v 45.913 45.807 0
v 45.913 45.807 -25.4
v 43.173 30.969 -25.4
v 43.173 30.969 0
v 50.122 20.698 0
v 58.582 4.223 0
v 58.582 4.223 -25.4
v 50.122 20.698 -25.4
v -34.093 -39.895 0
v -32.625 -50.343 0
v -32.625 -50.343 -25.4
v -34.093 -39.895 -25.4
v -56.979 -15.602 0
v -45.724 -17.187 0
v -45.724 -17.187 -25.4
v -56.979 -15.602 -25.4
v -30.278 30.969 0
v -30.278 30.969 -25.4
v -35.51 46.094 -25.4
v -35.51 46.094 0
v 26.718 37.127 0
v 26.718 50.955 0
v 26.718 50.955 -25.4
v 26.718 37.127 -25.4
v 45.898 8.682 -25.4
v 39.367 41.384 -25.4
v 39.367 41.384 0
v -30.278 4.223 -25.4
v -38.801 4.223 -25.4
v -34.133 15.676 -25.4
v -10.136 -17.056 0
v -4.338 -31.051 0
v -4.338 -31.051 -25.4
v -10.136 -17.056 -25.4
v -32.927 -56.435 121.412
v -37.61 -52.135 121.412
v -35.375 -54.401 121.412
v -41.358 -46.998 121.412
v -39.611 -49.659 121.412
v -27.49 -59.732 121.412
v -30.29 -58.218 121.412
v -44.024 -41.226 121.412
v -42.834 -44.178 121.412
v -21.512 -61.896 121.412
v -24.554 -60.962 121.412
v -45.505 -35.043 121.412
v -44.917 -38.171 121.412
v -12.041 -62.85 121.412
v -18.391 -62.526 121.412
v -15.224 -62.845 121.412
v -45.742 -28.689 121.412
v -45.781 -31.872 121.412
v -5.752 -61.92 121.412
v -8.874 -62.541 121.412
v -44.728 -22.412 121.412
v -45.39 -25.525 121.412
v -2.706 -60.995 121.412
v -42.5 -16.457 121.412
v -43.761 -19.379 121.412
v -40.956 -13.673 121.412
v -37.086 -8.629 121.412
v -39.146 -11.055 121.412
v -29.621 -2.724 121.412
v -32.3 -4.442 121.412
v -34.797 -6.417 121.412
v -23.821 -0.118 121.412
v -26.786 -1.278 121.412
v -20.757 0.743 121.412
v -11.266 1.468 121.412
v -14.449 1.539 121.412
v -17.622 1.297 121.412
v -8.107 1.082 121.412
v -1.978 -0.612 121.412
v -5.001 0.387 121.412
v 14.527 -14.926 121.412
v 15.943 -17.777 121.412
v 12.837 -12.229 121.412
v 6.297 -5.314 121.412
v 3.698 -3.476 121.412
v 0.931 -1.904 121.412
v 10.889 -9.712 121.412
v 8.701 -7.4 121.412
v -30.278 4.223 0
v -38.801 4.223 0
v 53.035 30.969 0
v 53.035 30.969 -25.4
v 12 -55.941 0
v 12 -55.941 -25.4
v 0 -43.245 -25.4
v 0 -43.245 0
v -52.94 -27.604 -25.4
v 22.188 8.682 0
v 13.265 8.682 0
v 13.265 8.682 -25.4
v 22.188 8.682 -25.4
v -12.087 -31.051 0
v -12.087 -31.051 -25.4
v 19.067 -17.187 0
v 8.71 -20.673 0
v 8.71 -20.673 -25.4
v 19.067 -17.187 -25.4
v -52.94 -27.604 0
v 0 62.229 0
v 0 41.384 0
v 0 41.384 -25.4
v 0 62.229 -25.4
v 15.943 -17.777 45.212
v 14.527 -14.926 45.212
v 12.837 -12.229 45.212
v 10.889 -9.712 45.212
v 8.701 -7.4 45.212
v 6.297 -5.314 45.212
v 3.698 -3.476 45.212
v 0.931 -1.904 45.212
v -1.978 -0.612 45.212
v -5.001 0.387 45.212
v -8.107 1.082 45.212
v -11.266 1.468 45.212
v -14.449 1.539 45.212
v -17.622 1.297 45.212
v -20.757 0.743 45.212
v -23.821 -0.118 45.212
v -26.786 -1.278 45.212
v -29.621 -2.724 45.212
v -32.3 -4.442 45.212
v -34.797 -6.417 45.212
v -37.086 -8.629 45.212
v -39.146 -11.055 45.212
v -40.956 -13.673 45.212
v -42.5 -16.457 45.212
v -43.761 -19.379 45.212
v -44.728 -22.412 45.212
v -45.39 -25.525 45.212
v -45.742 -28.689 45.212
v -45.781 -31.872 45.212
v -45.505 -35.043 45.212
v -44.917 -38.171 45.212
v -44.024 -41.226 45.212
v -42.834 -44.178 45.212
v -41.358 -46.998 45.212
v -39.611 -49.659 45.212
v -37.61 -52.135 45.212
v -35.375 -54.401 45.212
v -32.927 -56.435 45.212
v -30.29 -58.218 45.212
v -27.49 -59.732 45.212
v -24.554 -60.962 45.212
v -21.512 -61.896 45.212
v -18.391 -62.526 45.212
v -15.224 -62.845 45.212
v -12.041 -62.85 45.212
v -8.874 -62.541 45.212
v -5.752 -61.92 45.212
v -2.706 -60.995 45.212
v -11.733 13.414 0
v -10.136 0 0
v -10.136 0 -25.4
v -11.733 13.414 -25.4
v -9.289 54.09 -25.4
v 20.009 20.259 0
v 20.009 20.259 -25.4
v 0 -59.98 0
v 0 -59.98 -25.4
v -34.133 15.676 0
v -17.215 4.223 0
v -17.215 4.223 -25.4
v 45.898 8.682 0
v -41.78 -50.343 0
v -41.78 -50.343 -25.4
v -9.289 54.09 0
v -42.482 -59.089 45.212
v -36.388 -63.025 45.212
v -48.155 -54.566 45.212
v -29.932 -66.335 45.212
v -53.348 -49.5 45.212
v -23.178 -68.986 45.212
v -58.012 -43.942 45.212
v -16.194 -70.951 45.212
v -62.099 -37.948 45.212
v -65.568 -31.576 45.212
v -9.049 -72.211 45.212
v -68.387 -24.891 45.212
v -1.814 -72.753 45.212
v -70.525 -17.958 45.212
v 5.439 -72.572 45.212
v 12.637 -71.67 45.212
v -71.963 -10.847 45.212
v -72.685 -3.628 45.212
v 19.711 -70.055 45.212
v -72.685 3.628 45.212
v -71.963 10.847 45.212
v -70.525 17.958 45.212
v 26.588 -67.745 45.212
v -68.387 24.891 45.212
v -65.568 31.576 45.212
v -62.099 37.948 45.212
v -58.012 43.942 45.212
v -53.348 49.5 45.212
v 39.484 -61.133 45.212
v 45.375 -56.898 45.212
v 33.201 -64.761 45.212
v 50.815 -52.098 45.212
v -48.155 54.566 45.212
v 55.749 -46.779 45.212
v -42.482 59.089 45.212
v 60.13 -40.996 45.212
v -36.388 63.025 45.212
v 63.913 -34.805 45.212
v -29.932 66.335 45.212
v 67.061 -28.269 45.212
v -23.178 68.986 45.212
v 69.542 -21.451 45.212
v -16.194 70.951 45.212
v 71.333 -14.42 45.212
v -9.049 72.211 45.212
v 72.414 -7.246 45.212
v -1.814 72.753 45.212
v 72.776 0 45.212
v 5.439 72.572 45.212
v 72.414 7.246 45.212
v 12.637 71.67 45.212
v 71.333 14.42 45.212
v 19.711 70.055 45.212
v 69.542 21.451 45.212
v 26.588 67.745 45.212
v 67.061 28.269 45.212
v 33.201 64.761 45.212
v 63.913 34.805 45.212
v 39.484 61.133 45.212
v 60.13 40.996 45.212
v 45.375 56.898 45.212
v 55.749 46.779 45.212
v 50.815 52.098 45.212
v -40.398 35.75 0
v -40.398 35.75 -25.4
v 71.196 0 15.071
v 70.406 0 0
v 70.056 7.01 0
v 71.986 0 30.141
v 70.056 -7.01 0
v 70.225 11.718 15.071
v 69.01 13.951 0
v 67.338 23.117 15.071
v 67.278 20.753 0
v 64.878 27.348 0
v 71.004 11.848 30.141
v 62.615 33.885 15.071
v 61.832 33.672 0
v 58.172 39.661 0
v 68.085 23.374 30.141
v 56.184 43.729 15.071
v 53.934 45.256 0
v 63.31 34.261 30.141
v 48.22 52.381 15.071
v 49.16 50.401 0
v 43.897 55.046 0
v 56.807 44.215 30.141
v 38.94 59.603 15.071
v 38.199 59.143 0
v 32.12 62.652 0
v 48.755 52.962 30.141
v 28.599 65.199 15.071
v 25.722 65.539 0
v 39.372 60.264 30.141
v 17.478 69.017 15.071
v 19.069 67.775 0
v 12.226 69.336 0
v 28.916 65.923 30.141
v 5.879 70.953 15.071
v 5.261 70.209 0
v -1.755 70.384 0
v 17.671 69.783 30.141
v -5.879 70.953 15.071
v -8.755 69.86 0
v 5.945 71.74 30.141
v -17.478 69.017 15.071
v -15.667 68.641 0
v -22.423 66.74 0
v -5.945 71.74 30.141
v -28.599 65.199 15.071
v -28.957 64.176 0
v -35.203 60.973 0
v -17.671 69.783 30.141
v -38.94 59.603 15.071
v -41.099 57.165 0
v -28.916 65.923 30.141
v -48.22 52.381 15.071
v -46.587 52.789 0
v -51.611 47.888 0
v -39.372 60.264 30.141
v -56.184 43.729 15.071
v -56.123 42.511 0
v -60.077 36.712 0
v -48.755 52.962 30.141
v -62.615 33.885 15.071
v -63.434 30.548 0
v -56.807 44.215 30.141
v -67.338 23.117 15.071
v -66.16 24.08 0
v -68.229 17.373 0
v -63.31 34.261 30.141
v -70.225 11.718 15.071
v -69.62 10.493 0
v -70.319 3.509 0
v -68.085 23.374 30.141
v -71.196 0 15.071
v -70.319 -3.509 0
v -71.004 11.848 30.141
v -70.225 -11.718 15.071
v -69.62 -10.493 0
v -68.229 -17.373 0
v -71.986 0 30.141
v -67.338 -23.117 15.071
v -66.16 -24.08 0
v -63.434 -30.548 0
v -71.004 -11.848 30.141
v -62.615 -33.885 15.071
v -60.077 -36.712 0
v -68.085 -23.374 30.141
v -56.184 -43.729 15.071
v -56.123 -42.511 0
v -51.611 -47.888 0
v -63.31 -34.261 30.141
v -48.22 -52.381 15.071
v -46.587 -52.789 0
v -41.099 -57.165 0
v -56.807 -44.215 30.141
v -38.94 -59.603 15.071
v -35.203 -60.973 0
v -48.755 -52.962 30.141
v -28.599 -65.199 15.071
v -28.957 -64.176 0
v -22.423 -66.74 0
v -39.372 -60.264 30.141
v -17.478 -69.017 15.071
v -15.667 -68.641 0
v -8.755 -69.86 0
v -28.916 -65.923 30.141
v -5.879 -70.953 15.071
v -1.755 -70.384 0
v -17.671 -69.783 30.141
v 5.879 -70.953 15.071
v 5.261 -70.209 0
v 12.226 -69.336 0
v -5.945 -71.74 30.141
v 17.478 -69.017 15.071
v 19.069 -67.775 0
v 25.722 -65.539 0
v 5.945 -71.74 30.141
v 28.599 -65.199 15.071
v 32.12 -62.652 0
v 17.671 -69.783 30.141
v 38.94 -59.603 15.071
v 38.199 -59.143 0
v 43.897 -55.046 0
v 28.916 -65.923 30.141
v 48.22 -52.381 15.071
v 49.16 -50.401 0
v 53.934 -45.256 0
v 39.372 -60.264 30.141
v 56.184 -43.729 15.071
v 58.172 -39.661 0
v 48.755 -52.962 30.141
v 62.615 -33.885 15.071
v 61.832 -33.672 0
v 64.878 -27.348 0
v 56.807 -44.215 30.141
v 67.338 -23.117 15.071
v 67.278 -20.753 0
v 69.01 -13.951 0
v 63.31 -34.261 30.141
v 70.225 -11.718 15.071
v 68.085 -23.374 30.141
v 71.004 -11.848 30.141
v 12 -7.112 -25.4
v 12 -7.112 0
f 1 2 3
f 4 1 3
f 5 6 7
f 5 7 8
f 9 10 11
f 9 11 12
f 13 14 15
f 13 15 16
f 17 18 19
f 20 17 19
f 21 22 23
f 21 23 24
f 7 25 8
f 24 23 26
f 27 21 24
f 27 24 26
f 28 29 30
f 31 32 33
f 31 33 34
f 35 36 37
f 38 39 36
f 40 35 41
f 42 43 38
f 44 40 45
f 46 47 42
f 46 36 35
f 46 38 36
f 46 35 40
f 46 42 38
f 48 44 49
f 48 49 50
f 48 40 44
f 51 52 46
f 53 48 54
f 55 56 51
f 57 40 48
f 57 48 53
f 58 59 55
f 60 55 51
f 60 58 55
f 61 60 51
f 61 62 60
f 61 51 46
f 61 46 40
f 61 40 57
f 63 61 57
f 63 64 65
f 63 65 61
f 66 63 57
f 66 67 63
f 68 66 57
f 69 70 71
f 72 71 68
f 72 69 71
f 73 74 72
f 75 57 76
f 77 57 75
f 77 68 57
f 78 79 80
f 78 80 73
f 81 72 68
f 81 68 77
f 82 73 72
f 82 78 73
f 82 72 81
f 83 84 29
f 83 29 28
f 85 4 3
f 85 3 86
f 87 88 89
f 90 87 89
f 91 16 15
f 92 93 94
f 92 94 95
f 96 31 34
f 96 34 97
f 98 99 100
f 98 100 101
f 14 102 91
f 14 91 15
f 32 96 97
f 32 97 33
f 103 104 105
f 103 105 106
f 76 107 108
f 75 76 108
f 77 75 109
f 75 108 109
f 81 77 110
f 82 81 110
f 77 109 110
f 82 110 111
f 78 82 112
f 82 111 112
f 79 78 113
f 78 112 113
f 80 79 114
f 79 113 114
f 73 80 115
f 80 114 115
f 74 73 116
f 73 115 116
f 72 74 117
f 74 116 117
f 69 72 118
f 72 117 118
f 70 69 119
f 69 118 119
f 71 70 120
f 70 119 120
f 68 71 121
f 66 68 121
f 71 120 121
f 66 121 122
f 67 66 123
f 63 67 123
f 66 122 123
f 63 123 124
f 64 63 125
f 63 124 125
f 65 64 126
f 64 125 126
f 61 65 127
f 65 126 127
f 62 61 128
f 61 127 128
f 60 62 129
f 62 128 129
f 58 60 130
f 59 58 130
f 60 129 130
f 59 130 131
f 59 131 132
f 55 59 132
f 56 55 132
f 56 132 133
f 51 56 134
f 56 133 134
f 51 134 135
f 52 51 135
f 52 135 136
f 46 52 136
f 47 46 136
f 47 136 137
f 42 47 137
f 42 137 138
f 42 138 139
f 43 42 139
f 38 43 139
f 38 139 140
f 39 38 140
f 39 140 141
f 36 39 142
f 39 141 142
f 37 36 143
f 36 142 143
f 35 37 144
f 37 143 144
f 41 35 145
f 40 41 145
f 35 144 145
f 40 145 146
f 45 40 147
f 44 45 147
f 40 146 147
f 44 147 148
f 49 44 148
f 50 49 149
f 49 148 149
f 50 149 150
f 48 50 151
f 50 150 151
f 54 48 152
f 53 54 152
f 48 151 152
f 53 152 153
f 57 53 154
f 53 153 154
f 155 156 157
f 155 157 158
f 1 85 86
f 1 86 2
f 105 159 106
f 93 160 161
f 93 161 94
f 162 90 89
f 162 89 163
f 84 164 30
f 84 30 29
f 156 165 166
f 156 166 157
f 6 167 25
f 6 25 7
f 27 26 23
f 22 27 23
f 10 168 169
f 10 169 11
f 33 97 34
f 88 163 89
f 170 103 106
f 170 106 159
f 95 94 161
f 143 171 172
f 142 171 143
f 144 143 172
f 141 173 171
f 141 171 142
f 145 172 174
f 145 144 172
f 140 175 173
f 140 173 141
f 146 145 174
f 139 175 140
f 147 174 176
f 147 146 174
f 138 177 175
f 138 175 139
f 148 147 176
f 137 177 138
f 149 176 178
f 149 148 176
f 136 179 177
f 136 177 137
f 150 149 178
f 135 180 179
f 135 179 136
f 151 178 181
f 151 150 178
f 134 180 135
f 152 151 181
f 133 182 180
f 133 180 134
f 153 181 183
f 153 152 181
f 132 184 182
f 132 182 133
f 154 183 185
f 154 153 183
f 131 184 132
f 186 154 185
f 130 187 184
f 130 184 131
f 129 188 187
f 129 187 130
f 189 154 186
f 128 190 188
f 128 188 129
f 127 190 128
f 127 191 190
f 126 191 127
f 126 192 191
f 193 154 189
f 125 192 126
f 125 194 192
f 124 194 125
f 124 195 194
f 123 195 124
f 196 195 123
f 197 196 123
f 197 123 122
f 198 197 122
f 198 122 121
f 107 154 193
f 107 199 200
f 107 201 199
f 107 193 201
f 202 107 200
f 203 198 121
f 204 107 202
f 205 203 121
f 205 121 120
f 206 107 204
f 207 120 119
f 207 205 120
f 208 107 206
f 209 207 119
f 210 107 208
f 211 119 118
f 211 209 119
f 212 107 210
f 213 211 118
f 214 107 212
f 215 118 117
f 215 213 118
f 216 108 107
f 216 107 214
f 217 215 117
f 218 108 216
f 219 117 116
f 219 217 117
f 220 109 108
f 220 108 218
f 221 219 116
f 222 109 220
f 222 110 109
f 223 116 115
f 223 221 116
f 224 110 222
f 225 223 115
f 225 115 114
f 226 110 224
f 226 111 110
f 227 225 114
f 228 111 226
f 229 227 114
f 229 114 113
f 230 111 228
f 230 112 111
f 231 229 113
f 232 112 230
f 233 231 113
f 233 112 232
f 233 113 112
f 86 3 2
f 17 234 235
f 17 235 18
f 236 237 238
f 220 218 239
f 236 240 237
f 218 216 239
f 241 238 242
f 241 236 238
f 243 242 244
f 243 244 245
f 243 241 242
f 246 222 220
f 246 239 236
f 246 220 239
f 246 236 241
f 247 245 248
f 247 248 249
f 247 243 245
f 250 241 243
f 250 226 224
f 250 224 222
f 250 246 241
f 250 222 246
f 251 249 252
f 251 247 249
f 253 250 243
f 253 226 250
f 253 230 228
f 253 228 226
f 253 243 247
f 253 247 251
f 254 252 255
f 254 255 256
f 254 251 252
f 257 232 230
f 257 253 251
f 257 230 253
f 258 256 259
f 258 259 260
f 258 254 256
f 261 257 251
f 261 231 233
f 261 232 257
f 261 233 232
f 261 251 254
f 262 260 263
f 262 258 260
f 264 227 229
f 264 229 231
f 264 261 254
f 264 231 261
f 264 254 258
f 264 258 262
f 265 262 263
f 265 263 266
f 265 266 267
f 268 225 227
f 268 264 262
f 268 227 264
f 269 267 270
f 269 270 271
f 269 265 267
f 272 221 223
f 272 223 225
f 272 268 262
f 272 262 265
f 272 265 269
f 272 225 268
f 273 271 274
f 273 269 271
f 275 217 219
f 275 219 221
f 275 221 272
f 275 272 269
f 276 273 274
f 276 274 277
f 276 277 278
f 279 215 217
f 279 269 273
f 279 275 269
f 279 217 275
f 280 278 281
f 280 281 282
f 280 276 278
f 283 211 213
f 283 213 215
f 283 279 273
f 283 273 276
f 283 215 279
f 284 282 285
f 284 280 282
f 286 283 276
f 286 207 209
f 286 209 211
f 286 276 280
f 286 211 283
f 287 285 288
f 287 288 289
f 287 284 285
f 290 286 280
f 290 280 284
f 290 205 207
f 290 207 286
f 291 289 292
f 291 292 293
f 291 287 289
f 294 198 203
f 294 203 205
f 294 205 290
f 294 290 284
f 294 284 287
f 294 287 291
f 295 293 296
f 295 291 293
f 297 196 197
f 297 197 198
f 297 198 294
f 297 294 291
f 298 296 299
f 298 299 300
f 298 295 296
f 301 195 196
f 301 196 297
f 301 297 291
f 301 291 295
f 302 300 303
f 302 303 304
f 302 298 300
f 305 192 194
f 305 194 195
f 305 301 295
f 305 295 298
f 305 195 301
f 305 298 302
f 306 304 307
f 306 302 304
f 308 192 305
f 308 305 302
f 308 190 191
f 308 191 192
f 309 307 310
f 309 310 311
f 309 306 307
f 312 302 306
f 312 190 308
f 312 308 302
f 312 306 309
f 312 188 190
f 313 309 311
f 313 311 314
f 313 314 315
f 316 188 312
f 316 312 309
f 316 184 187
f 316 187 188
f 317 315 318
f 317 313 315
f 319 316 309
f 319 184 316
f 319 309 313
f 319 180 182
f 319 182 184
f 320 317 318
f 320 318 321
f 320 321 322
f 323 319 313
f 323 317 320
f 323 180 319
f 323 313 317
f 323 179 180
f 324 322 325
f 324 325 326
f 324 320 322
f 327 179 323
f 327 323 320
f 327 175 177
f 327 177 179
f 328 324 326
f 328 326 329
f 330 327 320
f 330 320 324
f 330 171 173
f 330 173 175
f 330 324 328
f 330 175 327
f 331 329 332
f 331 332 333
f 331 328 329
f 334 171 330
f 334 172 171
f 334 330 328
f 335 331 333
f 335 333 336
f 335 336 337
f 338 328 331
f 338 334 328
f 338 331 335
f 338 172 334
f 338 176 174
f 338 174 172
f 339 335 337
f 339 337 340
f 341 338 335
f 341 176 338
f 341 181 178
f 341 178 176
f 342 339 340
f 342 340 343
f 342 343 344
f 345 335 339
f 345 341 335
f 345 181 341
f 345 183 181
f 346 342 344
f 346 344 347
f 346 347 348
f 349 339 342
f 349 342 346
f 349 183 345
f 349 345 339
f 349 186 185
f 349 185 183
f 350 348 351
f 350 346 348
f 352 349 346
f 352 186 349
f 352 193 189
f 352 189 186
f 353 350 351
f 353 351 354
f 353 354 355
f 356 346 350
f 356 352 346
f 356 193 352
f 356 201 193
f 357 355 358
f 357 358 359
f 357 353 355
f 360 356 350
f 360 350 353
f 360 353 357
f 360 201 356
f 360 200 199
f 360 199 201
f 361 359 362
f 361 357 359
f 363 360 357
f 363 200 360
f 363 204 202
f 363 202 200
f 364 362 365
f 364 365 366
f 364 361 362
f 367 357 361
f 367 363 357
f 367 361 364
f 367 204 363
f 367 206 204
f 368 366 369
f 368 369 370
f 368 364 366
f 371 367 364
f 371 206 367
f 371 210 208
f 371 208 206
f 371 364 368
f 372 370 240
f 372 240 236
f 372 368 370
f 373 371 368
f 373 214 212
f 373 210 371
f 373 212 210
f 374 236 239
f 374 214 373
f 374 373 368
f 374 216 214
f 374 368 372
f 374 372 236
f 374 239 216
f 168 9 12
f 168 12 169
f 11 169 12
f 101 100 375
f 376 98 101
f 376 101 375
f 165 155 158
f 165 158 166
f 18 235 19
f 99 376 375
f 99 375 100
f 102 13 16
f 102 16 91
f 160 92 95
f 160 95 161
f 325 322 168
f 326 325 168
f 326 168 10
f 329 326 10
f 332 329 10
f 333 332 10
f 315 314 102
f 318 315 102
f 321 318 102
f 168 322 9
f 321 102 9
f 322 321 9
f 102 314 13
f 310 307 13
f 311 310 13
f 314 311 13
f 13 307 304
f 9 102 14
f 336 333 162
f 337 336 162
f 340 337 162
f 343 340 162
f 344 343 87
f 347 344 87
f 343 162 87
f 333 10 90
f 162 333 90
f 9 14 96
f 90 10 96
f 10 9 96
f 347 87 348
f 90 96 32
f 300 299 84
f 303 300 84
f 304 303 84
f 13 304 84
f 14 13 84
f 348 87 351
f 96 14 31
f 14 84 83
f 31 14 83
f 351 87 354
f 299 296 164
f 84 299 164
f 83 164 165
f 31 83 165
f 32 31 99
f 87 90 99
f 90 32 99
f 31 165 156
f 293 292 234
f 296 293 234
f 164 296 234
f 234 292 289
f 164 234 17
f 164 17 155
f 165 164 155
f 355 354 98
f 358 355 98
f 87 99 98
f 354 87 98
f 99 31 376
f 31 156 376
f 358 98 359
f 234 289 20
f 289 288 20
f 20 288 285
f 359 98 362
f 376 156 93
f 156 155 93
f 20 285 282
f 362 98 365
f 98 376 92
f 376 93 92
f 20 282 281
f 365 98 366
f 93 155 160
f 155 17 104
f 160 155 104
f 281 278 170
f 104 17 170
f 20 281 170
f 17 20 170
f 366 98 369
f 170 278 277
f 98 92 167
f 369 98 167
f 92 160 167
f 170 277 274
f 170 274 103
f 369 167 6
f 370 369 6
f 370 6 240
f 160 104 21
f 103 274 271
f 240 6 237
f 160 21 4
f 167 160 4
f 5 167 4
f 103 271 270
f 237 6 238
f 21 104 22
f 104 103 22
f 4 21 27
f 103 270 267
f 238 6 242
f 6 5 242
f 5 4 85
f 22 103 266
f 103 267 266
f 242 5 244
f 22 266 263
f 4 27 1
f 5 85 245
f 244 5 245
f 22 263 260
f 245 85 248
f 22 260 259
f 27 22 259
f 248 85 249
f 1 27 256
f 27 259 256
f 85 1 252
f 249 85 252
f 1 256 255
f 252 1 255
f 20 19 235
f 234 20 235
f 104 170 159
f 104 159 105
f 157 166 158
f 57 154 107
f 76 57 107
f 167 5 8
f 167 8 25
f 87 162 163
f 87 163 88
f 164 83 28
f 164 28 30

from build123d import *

# Parameters (mm, degrees)
F0_R     = 70.4060521859
F1_DEPTH = 45.212
F1_TAPER = -3
F4_DEPTH = 25.4
F6_DEPTH = 76.2


with BuildPart() as f1:
    # F0 (on Top) → F1 (new body)
    with BuildSketch(Plane.XY):
        Circle(F0_R)
    extrude(amount=F1_DEPTH, taper=F1_TAPER)

    # F3 (on face) → F4 (join)
    with BuildSketch(Plane.XY):
        Polygon((13.2651496679, 8.6820758879), (22.1880245954, 8.6820758879), (20.0088638812, 20.2589873224), align=None)
        Polygon((26.7175994813, 37.1265895665), (39.3666066229, 41.3835719228), (26.7175994813, 50.9552955627), align=None)
        Polygon((0, 41.3835719228), (0, 62.2292943299), (-9.2889685184, 54.0895685554), align=None)
        Polygon((-17.2152053565, 4.2226207443), (-10.1358499378, 0), (-11.7327948169, 13.4140530589), align=None)
        Polygon((-12.0866000652, -31.0505852103), (-4.3377871625, -31.0505852103), (-10.1358499378, -17.055625096), align=None)
        Polygon((0, -59.9799224224), (12.0000867173, -55.9413321316), (0, -43.2448089123), align=None)
        Polygon((45.8979159594, 8.6820758879), (58.5819035769, 4.2226207443), (50.1223825414, 20.6976876816), align=None)
        Polygon((-40.3976216912, 35.750195384), (-30.278051272, 30.9688523412), (-35.5101494777, 46.0943850381), align=None)
        Polygon((-52.9398620129, -27.6039075106), (-45.7244627178, -17.1867813915), (-56.9789598161, -15.6023127936), align=None)
        Polygon((8.7098376591, -20.6725607113), (19.0673265606, -17.1867813915), (12.0000867173, -7.1116369218), align=None)
        Polygon((-38.8014949858, 4.2226207443), (-30.278051272, 4.2226207443), (-34.1327454541, 15.676286782), align=None)
        Polygon((-41.7802073061, -50.3433160484), (-32.6245762408, -50.3433160484), (-34.0931266546, -39.8950539529), align=None)
        Polygon((43.1729927659, 30.9688523412), (53.0351176858, 30.9688523412), (45.9125488997, 45.8067990839), align=None)
    extrude(amount=-F4_DEPTH)

    # F5 (on face) → F6 (join)
    with BuildSketch(Plane.XY.offset(45.212)):
        with BuildLine():
            Line((-2.7060096618, -60.9949491918), (15.9434843808, -17.7769623697))
            ThreePointArc((15.9434843808, -17.7769623697), (-43.1665021025, -17.9025504898), (-2.7060096618, -60.9949491918))
        make_face()
    extrude(amount=F6_DEPTH)


solid = f1.part
